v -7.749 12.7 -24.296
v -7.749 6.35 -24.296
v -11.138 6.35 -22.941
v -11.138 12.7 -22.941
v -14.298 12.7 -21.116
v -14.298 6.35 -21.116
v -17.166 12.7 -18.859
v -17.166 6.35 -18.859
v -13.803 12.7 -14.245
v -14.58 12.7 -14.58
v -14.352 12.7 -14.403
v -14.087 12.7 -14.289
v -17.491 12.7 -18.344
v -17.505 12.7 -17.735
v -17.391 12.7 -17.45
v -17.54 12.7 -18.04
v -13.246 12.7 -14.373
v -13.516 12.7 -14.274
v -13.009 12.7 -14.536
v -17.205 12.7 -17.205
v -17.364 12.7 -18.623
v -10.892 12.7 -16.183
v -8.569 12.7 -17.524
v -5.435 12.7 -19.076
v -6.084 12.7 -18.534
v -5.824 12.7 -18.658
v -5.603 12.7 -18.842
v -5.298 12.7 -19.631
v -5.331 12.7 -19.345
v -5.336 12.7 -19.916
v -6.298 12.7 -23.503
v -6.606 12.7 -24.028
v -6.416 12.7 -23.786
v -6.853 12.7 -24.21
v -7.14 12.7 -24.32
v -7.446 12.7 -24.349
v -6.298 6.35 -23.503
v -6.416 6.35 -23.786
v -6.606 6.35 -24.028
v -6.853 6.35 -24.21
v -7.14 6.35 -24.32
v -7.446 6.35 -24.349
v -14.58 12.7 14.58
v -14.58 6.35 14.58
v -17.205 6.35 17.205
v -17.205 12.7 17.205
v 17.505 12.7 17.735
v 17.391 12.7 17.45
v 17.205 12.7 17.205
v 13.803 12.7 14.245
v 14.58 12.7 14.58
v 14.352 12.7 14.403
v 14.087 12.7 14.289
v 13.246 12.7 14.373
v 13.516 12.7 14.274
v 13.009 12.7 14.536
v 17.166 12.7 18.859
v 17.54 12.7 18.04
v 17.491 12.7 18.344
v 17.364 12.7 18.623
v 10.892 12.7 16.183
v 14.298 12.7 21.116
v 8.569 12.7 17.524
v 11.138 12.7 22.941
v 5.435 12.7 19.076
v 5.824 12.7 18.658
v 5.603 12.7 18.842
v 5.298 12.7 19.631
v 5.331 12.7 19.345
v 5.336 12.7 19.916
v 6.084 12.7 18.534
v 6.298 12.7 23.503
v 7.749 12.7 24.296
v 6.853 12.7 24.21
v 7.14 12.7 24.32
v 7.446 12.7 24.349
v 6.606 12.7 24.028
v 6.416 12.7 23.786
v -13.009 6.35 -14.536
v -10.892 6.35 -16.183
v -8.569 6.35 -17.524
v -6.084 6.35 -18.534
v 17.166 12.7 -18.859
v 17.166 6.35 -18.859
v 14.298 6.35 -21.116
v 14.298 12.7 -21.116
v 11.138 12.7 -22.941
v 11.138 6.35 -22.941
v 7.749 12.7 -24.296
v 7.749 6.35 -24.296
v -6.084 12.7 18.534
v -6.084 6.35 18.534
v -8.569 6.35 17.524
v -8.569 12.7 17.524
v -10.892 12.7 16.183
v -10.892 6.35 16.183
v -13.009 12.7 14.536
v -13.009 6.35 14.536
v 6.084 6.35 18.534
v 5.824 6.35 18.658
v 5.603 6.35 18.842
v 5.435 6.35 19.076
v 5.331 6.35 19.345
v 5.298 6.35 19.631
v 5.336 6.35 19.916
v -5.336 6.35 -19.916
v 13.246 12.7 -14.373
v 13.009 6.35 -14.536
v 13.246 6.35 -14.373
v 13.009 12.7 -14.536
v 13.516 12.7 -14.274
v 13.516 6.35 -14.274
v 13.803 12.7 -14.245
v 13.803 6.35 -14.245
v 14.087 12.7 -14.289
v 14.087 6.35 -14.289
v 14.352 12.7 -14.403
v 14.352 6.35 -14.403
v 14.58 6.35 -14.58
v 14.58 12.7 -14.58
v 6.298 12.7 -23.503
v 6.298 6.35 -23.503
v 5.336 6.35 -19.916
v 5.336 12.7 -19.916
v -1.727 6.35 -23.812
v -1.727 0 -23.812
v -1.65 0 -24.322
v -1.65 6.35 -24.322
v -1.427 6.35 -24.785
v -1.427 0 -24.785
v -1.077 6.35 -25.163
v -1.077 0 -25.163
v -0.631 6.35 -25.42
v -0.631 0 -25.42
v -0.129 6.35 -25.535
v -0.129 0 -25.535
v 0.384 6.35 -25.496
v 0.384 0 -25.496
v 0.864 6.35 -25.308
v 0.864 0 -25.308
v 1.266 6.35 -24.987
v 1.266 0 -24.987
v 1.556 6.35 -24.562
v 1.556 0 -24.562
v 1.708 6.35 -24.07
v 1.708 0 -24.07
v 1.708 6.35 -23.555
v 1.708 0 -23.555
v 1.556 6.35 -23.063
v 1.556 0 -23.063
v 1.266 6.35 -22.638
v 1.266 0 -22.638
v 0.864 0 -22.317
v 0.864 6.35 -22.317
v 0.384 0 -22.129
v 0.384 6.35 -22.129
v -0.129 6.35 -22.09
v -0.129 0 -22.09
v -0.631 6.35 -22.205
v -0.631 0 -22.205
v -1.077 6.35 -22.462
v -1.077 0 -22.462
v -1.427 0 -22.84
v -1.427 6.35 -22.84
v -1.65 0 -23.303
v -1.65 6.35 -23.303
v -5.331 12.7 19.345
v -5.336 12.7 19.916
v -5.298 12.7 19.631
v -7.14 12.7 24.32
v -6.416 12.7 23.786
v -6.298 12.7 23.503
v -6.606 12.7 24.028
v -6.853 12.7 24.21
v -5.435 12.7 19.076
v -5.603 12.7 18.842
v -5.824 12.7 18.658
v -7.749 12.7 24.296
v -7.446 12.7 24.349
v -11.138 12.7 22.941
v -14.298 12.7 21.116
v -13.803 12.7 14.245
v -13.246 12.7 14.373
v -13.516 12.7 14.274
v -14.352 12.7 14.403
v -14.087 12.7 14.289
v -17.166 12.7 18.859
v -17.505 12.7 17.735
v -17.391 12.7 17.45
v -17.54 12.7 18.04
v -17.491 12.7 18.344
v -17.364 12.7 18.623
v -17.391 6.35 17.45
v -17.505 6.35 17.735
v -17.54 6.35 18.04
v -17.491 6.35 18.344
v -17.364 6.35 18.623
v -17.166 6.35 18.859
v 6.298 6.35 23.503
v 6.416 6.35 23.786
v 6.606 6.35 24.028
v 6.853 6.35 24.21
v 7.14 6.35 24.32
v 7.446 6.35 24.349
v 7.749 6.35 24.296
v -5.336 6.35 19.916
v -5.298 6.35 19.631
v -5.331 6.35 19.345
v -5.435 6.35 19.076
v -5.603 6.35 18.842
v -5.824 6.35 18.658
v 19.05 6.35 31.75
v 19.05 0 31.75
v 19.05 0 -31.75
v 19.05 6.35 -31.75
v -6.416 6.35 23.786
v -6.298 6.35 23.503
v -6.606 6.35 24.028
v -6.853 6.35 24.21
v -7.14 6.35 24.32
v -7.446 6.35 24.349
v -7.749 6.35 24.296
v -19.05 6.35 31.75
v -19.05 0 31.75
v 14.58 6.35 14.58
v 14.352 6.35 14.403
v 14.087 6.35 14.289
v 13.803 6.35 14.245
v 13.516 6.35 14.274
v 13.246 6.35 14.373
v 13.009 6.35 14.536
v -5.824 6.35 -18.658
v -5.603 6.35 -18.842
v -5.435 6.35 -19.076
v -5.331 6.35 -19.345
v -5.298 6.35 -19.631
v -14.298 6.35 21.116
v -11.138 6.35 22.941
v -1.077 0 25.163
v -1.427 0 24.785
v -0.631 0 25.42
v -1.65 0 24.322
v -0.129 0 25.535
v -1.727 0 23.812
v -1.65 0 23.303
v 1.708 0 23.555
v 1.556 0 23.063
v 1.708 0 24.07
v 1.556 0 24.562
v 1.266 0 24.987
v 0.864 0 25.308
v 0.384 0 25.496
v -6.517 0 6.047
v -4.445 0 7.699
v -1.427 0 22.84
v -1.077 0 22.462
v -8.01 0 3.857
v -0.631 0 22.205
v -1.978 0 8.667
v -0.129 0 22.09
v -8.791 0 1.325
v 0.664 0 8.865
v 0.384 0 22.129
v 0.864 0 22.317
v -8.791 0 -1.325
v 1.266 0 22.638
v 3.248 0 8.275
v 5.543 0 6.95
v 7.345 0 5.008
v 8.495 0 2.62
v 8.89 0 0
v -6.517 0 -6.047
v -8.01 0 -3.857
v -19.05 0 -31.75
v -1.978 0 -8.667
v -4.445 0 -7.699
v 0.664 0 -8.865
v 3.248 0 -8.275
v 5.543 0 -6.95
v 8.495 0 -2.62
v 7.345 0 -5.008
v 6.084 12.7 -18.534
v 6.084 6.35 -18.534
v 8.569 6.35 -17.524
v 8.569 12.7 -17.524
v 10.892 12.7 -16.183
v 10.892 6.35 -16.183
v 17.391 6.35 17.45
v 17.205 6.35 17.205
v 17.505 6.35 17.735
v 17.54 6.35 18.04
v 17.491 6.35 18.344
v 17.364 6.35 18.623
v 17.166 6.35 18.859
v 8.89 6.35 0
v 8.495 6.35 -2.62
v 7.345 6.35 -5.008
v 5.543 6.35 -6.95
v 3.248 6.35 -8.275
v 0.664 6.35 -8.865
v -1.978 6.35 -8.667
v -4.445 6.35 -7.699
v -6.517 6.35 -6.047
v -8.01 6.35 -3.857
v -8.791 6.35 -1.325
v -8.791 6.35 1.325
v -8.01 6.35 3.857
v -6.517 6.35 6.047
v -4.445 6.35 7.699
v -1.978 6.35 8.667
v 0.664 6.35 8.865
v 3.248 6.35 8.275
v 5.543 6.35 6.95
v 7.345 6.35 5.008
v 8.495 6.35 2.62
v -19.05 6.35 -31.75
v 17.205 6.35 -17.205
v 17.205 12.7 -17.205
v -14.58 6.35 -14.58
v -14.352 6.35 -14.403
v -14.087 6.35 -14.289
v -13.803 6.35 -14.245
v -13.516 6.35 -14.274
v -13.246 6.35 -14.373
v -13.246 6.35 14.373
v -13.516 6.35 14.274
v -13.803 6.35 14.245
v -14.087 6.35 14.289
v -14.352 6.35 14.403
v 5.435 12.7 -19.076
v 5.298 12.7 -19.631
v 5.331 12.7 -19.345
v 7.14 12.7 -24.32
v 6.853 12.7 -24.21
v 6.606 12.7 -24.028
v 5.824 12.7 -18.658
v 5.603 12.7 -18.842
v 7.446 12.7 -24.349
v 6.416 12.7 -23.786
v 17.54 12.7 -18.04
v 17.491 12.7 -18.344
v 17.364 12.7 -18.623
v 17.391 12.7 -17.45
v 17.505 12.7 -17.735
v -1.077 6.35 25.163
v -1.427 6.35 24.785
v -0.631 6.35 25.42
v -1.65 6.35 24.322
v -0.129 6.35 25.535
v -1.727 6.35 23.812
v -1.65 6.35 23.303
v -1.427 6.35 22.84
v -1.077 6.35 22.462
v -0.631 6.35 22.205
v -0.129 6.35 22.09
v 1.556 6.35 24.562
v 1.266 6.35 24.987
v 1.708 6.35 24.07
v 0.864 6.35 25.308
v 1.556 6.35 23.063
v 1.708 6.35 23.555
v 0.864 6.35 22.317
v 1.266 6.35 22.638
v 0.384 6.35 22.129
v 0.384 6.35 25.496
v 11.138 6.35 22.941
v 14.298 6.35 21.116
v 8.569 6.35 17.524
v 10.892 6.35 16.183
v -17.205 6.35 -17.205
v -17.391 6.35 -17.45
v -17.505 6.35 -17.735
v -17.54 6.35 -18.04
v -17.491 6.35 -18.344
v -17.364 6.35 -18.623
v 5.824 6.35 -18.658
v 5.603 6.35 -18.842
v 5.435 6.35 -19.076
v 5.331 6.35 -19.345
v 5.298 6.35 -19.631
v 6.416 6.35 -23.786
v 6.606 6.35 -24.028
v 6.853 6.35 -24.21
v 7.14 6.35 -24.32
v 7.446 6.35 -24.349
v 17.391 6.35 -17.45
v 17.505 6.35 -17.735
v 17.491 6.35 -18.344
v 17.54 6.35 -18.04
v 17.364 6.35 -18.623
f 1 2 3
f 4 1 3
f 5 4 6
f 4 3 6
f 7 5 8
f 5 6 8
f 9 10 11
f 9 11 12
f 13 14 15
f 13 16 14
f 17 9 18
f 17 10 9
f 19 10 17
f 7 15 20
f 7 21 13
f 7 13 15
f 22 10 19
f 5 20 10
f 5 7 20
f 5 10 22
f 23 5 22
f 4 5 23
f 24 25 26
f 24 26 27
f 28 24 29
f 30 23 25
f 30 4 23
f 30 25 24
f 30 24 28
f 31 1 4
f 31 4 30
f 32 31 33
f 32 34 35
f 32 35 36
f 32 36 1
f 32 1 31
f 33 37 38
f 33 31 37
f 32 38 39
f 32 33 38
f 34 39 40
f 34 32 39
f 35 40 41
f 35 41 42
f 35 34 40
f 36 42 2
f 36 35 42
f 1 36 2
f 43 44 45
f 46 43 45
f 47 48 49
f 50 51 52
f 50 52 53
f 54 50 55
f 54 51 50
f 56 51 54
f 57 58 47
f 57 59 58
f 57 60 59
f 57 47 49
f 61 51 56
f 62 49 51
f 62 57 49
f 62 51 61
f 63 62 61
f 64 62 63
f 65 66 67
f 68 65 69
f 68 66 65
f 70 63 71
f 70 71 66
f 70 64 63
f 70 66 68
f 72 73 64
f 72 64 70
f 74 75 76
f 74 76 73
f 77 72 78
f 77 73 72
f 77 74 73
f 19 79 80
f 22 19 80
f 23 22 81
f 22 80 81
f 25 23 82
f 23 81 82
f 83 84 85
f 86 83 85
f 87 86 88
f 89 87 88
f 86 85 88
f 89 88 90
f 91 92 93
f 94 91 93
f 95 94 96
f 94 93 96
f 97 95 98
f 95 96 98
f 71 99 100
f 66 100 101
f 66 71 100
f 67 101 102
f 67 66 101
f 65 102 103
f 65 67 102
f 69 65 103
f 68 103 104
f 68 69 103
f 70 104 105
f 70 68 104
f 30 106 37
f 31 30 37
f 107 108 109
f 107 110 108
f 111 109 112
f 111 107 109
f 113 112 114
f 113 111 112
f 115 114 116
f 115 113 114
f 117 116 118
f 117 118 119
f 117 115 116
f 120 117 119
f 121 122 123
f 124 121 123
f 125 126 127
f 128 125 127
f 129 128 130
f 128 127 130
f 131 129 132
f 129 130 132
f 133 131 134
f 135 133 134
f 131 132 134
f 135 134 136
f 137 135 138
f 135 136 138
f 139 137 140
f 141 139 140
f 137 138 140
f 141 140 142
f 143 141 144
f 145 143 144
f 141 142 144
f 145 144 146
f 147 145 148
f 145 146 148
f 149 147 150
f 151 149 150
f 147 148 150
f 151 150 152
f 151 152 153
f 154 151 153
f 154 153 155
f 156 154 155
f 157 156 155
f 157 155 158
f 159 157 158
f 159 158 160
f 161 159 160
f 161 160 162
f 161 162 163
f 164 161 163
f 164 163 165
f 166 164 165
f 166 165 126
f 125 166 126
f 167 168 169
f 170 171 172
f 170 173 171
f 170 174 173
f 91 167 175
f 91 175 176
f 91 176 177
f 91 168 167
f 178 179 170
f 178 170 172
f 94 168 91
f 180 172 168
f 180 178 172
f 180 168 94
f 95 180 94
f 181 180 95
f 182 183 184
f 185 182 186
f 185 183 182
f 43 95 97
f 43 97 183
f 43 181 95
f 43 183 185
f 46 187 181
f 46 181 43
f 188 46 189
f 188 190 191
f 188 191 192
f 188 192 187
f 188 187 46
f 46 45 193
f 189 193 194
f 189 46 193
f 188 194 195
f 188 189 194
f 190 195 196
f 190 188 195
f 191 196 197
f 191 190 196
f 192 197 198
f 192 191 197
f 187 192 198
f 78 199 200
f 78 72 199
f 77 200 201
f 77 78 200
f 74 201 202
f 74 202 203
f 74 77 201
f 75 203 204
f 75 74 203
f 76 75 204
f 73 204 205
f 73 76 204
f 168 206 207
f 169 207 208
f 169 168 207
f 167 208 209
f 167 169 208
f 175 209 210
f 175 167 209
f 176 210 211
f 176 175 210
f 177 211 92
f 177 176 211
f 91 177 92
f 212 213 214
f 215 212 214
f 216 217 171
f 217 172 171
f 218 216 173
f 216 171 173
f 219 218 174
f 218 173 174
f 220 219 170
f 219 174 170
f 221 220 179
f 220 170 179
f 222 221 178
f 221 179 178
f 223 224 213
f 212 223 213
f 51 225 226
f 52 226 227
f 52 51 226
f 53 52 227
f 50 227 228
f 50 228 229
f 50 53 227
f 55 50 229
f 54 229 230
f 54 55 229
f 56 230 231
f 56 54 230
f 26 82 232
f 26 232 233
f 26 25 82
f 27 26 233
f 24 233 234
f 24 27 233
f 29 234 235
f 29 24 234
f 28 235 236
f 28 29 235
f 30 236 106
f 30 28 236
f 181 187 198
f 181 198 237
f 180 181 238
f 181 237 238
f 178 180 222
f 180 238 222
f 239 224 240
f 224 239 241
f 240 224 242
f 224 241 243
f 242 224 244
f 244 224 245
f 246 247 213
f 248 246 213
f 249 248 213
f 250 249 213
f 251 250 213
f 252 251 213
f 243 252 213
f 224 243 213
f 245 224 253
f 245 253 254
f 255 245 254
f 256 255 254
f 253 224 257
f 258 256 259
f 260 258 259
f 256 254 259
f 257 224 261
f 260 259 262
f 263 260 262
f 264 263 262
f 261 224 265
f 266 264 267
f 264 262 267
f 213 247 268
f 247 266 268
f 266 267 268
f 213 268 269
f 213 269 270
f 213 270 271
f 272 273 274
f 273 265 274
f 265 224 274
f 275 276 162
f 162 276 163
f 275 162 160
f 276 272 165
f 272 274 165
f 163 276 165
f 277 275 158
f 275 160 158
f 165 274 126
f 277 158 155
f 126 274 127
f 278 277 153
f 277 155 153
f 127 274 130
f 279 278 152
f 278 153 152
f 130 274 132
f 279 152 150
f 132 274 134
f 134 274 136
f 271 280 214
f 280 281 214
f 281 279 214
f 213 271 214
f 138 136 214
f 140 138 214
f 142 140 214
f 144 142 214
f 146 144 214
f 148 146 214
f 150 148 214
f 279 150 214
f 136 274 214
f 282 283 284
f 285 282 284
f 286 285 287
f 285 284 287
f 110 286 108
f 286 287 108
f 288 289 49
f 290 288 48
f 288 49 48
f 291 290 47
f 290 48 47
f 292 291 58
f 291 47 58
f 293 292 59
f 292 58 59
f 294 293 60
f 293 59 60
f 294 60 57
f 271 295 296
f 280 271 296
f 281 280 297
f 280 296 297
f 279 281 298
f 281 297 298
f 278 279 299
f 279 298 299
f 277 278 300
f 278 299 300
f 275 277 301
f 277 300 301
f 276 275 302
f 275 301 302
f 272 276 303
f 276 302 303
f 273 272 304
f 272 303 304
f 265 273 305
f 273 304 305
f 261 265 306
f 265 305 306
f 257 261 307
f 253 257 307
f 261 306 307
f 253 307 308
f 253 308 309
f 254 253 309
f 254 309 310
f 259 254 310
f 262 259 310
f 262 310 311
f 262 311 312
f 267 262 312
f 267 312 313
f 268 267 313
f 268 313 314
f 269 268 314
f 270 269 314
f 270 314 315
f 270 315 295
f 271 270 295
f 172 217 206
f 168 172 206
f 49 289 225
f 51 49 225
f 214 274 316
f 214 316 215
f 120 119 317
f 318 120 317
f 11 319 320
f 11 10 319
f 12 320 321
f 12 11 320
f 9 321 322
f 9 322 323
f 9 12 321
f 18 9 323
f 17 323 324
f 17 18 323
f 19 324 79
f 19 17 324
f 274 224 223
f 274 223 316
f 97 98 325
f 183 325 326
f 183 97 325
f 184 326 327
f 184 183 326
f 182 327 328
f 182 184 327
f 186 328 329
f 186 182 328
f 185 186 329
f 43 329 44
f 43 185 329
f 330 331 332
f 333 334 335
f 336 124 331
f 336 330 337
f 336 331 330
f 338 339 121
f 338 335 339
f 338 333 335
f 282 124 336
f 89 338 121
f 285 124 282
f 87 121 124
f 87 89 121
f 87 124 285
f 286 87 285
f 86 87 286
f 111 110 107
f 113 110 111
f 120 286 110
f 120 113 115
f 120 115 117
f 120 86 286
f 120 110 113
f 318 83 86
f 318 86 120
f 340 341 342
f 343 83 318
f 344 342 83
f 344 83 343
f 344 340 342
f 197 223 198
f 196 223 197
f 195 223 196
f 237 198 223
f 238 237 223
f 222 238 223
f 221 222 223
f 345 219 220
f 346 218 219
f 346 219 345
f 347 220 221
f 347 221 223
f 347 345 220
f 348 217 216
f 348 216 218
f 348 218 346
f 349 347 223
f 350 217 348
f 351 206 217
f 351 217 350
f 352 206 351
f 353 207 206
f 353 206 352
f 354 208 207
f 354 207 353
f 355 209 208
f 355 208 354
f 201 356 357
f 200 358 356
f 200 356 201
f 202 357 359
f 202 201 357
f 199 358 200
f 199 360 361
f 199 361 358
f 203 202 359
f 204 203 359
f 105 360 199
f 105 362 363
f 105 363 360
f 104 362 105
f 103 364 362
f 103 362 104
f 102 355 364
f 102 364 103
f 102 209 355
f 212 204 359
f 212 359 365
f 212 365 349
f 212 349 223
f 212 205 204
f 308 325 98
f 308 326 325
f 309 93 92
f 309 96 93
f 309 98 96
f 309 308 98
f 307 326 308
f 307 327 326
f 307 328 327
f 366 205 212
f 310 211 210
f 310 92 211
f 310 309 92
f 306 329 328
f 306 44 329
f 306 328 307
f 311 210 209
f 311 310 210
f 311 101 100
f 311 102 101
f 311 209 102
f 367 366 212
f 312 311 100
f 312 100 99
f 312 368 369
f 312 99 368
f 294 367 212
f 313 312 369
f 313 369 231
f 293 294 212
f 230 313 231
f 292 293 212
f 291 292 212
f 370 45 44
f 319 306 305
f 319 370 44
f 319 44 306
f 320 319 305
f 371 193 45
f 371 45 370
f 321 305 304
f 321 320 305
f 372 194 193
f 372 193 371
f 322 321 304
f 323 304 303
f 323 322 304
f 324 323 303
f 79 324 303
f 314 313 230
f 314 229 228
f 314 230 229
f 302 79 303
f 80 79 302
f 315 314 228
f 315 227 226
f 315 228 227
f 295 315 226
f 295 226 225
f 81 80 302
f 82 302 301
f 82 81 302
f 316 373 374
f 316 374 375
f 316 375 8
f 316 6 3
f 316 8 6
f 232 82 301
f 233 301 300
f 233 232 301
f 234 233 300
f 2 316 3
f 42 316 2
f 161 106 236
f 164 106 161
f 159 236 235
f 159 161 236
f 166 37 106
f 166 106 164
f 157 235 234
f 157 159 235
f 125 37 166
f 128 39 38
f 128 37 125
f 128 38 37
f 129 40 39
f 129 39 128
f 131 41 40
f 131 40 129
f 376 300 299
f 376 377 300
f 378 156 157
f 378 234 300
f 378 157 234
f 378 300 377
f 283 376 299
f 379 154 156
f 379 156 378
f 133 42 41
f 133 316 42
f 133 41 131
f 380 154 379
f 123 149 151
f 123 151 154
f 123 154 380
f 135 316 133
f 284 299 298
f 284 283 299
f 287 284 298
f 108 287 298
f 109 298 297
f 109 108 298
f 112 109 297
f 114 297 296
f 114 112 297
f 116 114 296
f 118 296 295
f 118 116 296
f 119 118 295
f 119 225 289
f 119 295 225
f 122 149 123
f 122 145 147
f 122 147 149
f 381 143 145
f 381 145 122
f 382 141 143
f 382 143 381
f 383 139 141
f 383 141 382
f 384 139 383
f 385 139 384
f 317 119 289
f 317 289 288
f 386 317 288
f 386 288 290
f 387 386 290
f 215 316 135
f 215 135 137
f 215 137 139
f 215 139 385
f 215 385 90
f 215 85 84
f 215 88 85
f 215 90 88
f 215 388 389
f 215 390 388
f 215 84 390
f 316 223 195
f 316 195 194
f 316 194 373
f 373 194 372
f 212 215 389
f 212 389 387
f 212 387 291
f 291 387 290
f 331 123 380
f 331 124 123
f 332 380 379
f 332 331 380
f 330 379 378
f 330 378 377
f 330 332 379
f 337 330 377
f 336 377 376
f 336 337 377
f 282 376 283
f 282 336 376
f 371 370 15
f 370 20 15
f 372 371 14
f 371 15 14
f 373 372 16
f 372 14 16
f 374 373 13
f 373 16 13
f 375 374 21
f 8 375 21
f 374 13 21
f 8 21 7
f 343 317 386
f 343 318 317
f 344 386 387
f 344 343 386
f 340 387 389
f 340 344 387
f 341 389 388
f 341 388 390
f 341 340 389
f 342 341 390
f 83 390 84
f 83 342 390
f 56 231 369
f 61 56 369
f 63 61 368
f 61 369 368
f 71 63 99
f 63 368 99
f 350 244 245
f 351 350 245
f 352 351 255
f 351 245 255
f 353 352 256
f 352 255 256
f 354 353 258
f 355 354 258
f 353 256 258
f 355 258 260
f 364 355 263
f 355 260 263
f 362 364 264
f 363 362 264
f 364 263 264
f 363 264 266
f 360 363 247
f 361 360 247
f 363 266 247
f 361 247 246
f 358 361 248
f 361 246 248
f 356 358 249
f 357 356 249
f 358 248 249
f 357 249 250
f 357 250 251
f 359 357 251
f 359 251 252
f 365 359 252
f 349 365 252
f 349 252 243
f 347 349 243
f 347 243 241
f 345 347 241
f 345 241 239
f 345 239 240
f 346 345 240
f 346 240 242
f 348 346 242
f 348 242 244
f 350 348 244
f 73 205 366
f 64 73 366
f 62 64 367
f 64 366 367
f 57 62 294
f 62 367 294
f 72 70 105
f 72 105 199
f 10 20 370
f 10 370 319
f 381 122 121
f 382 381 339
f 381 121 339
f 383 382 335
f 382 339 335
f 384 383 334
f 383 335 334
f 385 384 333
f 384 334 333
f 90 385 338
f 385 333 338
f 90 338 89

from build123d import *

# Parameters (mm, degrees)
SKETCH1_W                 = 38.1
SKETCH1_H                 = 63.5
BOSS_EXTRUDE1_DEPTH       = 6.35
BOSS_EXTRUDE2_DEPTH       = 6.35
FILLET1_R                 = 1.143
CIRPATTERN1_COUNT         = 6
FILLET1_OF_CIRPATTERN1_R  = 1.143
SKETCH3_R                 = 8.89
CUT_EXTRUDE1_DEPTH        = 7.35
F_8_32_TAPPED_HOLE1_D     = 3.4544
F_8_32_TAPPED_HOLE1_DEPTH = 6.35


with BuildPart() as part:
    # Sketch1 → Boss-Extrude1 (new body)
    with BuildSketch(Plane(origin=(0, 0, 0), x_dir=(1, 0, 0), z_dir=(0, 1, 0))):
        Rectangle(SKETCH1_W, SKETCH1_H)
    extrude(amount=BOSS_EXTRUDE1_DEPTH)

    # Sketch2 → Boss-Extrude2 (add)
    with BuildSketch(Plane(origin=(0, 6.35, 0), x_dir=(1, 0, 0), z_dir=(0, 1, 0))):
        with BuildLine():
            Line((-18.032354291, 18.032354291), (-13.793673402, 13.793673402))
            ThreePointArc((-13.793673402, 13.793673402), (-9.7536, 16.893730757), (-5.048834877, 18.842508279))
            Line((-5.048834877, 18.842508279), (-6.600299761, 24.632654052))
            ThreePointArc((-6.600299761, 24.632654052), (-12.7508, 22.085033437), (-18.032354291, 18.032354291))
        make_face()
    boss_extrude2 = extrude(amount=BOSS_EXTRUDE2_DEPTH)

    # Fillet1
    fillet1_edges = [part.edges().sort_by_distance(p)[0] for p in [
        (-6.600299761, 9.525, -24.632654052),
        (-18.032354291, 9.525, -18.032354291),
        (-13.793673402, 9.525, -13.793673402),
        (-5.048834877, 9.525, -18.842508279),
    ]]
    fillet(fillet1_edges, radius=FILLET1_R)

    # CirPattern1: Boss-Extrude2 ×6 about axis, 2 skipped
    cirpattern1_axis = Axis((0, 12.7, 0), (0, 1, 0))
    add([boss_extrude2.rotate(cirpattern1_axis, i * 360 / CIRPATTERN1_COUNT) for i in range(1, CIRPATTERN1_COUNT) if i not in (1, 4)])

    # Fillet1 of CirPattern1
    fillet1_of_cirpattern1_edges = [part.edges().sort_by_distance(p)[0] for p in [
        (-18.032354291, 9.525, 18.032354291),
        (-6.600299761, 9.525, 24.632654052),
        (-5.048834877, 9.525, 18.842508279),
        (-13.793673402, 9.525, 13.793673402),
        (6.600299761, 9.525, 24.632654052),
        (18.032354291, 9.525, 18.032354291),
        (13.793673402, 9.525, 13.793673402),
        (5.048834877, 9.525, 18.842508279),
        (18.032354291, 9.525, -18.032354291),
        (6.600299761, 9.525, -24.632654052),
        (5.048834877, 9.525, -18.842508279),
        (13.793673402, 9.525, -13.793673402),
    ]]
    fillet(fillet1_of_cirpattern1_edges, radius=FILLET1_OF_CIRPATTERN1_R)

    # Sketch3 → Cut-Extrude1 (cut, through all)
    with BuildSketch(Plane(origin=(0, 6.35, 0), x_dir=(1, 0, 0), z_dir=(0, 1, 0))):
        Circle(SKETCH3_R)
    extrude(amount=-CUT_EXTRUDE1_DEPTH, mode=Mode.SUBTRACT)

    # #8-32 Tapped Hole1
    with Locations(Plane(origin=(0, 6.35, 0), x_dir=(1, 0, 0), z_dir=(0, 1, 0))):
        with Locations((0, -23.8125), (0, 23.8125)):
            Hole(F_8_32_TAPPED_HOLE1_D / 2, depth=F_8_32_TAPPED_HOLE1_DEPTH)


solid = part.part
